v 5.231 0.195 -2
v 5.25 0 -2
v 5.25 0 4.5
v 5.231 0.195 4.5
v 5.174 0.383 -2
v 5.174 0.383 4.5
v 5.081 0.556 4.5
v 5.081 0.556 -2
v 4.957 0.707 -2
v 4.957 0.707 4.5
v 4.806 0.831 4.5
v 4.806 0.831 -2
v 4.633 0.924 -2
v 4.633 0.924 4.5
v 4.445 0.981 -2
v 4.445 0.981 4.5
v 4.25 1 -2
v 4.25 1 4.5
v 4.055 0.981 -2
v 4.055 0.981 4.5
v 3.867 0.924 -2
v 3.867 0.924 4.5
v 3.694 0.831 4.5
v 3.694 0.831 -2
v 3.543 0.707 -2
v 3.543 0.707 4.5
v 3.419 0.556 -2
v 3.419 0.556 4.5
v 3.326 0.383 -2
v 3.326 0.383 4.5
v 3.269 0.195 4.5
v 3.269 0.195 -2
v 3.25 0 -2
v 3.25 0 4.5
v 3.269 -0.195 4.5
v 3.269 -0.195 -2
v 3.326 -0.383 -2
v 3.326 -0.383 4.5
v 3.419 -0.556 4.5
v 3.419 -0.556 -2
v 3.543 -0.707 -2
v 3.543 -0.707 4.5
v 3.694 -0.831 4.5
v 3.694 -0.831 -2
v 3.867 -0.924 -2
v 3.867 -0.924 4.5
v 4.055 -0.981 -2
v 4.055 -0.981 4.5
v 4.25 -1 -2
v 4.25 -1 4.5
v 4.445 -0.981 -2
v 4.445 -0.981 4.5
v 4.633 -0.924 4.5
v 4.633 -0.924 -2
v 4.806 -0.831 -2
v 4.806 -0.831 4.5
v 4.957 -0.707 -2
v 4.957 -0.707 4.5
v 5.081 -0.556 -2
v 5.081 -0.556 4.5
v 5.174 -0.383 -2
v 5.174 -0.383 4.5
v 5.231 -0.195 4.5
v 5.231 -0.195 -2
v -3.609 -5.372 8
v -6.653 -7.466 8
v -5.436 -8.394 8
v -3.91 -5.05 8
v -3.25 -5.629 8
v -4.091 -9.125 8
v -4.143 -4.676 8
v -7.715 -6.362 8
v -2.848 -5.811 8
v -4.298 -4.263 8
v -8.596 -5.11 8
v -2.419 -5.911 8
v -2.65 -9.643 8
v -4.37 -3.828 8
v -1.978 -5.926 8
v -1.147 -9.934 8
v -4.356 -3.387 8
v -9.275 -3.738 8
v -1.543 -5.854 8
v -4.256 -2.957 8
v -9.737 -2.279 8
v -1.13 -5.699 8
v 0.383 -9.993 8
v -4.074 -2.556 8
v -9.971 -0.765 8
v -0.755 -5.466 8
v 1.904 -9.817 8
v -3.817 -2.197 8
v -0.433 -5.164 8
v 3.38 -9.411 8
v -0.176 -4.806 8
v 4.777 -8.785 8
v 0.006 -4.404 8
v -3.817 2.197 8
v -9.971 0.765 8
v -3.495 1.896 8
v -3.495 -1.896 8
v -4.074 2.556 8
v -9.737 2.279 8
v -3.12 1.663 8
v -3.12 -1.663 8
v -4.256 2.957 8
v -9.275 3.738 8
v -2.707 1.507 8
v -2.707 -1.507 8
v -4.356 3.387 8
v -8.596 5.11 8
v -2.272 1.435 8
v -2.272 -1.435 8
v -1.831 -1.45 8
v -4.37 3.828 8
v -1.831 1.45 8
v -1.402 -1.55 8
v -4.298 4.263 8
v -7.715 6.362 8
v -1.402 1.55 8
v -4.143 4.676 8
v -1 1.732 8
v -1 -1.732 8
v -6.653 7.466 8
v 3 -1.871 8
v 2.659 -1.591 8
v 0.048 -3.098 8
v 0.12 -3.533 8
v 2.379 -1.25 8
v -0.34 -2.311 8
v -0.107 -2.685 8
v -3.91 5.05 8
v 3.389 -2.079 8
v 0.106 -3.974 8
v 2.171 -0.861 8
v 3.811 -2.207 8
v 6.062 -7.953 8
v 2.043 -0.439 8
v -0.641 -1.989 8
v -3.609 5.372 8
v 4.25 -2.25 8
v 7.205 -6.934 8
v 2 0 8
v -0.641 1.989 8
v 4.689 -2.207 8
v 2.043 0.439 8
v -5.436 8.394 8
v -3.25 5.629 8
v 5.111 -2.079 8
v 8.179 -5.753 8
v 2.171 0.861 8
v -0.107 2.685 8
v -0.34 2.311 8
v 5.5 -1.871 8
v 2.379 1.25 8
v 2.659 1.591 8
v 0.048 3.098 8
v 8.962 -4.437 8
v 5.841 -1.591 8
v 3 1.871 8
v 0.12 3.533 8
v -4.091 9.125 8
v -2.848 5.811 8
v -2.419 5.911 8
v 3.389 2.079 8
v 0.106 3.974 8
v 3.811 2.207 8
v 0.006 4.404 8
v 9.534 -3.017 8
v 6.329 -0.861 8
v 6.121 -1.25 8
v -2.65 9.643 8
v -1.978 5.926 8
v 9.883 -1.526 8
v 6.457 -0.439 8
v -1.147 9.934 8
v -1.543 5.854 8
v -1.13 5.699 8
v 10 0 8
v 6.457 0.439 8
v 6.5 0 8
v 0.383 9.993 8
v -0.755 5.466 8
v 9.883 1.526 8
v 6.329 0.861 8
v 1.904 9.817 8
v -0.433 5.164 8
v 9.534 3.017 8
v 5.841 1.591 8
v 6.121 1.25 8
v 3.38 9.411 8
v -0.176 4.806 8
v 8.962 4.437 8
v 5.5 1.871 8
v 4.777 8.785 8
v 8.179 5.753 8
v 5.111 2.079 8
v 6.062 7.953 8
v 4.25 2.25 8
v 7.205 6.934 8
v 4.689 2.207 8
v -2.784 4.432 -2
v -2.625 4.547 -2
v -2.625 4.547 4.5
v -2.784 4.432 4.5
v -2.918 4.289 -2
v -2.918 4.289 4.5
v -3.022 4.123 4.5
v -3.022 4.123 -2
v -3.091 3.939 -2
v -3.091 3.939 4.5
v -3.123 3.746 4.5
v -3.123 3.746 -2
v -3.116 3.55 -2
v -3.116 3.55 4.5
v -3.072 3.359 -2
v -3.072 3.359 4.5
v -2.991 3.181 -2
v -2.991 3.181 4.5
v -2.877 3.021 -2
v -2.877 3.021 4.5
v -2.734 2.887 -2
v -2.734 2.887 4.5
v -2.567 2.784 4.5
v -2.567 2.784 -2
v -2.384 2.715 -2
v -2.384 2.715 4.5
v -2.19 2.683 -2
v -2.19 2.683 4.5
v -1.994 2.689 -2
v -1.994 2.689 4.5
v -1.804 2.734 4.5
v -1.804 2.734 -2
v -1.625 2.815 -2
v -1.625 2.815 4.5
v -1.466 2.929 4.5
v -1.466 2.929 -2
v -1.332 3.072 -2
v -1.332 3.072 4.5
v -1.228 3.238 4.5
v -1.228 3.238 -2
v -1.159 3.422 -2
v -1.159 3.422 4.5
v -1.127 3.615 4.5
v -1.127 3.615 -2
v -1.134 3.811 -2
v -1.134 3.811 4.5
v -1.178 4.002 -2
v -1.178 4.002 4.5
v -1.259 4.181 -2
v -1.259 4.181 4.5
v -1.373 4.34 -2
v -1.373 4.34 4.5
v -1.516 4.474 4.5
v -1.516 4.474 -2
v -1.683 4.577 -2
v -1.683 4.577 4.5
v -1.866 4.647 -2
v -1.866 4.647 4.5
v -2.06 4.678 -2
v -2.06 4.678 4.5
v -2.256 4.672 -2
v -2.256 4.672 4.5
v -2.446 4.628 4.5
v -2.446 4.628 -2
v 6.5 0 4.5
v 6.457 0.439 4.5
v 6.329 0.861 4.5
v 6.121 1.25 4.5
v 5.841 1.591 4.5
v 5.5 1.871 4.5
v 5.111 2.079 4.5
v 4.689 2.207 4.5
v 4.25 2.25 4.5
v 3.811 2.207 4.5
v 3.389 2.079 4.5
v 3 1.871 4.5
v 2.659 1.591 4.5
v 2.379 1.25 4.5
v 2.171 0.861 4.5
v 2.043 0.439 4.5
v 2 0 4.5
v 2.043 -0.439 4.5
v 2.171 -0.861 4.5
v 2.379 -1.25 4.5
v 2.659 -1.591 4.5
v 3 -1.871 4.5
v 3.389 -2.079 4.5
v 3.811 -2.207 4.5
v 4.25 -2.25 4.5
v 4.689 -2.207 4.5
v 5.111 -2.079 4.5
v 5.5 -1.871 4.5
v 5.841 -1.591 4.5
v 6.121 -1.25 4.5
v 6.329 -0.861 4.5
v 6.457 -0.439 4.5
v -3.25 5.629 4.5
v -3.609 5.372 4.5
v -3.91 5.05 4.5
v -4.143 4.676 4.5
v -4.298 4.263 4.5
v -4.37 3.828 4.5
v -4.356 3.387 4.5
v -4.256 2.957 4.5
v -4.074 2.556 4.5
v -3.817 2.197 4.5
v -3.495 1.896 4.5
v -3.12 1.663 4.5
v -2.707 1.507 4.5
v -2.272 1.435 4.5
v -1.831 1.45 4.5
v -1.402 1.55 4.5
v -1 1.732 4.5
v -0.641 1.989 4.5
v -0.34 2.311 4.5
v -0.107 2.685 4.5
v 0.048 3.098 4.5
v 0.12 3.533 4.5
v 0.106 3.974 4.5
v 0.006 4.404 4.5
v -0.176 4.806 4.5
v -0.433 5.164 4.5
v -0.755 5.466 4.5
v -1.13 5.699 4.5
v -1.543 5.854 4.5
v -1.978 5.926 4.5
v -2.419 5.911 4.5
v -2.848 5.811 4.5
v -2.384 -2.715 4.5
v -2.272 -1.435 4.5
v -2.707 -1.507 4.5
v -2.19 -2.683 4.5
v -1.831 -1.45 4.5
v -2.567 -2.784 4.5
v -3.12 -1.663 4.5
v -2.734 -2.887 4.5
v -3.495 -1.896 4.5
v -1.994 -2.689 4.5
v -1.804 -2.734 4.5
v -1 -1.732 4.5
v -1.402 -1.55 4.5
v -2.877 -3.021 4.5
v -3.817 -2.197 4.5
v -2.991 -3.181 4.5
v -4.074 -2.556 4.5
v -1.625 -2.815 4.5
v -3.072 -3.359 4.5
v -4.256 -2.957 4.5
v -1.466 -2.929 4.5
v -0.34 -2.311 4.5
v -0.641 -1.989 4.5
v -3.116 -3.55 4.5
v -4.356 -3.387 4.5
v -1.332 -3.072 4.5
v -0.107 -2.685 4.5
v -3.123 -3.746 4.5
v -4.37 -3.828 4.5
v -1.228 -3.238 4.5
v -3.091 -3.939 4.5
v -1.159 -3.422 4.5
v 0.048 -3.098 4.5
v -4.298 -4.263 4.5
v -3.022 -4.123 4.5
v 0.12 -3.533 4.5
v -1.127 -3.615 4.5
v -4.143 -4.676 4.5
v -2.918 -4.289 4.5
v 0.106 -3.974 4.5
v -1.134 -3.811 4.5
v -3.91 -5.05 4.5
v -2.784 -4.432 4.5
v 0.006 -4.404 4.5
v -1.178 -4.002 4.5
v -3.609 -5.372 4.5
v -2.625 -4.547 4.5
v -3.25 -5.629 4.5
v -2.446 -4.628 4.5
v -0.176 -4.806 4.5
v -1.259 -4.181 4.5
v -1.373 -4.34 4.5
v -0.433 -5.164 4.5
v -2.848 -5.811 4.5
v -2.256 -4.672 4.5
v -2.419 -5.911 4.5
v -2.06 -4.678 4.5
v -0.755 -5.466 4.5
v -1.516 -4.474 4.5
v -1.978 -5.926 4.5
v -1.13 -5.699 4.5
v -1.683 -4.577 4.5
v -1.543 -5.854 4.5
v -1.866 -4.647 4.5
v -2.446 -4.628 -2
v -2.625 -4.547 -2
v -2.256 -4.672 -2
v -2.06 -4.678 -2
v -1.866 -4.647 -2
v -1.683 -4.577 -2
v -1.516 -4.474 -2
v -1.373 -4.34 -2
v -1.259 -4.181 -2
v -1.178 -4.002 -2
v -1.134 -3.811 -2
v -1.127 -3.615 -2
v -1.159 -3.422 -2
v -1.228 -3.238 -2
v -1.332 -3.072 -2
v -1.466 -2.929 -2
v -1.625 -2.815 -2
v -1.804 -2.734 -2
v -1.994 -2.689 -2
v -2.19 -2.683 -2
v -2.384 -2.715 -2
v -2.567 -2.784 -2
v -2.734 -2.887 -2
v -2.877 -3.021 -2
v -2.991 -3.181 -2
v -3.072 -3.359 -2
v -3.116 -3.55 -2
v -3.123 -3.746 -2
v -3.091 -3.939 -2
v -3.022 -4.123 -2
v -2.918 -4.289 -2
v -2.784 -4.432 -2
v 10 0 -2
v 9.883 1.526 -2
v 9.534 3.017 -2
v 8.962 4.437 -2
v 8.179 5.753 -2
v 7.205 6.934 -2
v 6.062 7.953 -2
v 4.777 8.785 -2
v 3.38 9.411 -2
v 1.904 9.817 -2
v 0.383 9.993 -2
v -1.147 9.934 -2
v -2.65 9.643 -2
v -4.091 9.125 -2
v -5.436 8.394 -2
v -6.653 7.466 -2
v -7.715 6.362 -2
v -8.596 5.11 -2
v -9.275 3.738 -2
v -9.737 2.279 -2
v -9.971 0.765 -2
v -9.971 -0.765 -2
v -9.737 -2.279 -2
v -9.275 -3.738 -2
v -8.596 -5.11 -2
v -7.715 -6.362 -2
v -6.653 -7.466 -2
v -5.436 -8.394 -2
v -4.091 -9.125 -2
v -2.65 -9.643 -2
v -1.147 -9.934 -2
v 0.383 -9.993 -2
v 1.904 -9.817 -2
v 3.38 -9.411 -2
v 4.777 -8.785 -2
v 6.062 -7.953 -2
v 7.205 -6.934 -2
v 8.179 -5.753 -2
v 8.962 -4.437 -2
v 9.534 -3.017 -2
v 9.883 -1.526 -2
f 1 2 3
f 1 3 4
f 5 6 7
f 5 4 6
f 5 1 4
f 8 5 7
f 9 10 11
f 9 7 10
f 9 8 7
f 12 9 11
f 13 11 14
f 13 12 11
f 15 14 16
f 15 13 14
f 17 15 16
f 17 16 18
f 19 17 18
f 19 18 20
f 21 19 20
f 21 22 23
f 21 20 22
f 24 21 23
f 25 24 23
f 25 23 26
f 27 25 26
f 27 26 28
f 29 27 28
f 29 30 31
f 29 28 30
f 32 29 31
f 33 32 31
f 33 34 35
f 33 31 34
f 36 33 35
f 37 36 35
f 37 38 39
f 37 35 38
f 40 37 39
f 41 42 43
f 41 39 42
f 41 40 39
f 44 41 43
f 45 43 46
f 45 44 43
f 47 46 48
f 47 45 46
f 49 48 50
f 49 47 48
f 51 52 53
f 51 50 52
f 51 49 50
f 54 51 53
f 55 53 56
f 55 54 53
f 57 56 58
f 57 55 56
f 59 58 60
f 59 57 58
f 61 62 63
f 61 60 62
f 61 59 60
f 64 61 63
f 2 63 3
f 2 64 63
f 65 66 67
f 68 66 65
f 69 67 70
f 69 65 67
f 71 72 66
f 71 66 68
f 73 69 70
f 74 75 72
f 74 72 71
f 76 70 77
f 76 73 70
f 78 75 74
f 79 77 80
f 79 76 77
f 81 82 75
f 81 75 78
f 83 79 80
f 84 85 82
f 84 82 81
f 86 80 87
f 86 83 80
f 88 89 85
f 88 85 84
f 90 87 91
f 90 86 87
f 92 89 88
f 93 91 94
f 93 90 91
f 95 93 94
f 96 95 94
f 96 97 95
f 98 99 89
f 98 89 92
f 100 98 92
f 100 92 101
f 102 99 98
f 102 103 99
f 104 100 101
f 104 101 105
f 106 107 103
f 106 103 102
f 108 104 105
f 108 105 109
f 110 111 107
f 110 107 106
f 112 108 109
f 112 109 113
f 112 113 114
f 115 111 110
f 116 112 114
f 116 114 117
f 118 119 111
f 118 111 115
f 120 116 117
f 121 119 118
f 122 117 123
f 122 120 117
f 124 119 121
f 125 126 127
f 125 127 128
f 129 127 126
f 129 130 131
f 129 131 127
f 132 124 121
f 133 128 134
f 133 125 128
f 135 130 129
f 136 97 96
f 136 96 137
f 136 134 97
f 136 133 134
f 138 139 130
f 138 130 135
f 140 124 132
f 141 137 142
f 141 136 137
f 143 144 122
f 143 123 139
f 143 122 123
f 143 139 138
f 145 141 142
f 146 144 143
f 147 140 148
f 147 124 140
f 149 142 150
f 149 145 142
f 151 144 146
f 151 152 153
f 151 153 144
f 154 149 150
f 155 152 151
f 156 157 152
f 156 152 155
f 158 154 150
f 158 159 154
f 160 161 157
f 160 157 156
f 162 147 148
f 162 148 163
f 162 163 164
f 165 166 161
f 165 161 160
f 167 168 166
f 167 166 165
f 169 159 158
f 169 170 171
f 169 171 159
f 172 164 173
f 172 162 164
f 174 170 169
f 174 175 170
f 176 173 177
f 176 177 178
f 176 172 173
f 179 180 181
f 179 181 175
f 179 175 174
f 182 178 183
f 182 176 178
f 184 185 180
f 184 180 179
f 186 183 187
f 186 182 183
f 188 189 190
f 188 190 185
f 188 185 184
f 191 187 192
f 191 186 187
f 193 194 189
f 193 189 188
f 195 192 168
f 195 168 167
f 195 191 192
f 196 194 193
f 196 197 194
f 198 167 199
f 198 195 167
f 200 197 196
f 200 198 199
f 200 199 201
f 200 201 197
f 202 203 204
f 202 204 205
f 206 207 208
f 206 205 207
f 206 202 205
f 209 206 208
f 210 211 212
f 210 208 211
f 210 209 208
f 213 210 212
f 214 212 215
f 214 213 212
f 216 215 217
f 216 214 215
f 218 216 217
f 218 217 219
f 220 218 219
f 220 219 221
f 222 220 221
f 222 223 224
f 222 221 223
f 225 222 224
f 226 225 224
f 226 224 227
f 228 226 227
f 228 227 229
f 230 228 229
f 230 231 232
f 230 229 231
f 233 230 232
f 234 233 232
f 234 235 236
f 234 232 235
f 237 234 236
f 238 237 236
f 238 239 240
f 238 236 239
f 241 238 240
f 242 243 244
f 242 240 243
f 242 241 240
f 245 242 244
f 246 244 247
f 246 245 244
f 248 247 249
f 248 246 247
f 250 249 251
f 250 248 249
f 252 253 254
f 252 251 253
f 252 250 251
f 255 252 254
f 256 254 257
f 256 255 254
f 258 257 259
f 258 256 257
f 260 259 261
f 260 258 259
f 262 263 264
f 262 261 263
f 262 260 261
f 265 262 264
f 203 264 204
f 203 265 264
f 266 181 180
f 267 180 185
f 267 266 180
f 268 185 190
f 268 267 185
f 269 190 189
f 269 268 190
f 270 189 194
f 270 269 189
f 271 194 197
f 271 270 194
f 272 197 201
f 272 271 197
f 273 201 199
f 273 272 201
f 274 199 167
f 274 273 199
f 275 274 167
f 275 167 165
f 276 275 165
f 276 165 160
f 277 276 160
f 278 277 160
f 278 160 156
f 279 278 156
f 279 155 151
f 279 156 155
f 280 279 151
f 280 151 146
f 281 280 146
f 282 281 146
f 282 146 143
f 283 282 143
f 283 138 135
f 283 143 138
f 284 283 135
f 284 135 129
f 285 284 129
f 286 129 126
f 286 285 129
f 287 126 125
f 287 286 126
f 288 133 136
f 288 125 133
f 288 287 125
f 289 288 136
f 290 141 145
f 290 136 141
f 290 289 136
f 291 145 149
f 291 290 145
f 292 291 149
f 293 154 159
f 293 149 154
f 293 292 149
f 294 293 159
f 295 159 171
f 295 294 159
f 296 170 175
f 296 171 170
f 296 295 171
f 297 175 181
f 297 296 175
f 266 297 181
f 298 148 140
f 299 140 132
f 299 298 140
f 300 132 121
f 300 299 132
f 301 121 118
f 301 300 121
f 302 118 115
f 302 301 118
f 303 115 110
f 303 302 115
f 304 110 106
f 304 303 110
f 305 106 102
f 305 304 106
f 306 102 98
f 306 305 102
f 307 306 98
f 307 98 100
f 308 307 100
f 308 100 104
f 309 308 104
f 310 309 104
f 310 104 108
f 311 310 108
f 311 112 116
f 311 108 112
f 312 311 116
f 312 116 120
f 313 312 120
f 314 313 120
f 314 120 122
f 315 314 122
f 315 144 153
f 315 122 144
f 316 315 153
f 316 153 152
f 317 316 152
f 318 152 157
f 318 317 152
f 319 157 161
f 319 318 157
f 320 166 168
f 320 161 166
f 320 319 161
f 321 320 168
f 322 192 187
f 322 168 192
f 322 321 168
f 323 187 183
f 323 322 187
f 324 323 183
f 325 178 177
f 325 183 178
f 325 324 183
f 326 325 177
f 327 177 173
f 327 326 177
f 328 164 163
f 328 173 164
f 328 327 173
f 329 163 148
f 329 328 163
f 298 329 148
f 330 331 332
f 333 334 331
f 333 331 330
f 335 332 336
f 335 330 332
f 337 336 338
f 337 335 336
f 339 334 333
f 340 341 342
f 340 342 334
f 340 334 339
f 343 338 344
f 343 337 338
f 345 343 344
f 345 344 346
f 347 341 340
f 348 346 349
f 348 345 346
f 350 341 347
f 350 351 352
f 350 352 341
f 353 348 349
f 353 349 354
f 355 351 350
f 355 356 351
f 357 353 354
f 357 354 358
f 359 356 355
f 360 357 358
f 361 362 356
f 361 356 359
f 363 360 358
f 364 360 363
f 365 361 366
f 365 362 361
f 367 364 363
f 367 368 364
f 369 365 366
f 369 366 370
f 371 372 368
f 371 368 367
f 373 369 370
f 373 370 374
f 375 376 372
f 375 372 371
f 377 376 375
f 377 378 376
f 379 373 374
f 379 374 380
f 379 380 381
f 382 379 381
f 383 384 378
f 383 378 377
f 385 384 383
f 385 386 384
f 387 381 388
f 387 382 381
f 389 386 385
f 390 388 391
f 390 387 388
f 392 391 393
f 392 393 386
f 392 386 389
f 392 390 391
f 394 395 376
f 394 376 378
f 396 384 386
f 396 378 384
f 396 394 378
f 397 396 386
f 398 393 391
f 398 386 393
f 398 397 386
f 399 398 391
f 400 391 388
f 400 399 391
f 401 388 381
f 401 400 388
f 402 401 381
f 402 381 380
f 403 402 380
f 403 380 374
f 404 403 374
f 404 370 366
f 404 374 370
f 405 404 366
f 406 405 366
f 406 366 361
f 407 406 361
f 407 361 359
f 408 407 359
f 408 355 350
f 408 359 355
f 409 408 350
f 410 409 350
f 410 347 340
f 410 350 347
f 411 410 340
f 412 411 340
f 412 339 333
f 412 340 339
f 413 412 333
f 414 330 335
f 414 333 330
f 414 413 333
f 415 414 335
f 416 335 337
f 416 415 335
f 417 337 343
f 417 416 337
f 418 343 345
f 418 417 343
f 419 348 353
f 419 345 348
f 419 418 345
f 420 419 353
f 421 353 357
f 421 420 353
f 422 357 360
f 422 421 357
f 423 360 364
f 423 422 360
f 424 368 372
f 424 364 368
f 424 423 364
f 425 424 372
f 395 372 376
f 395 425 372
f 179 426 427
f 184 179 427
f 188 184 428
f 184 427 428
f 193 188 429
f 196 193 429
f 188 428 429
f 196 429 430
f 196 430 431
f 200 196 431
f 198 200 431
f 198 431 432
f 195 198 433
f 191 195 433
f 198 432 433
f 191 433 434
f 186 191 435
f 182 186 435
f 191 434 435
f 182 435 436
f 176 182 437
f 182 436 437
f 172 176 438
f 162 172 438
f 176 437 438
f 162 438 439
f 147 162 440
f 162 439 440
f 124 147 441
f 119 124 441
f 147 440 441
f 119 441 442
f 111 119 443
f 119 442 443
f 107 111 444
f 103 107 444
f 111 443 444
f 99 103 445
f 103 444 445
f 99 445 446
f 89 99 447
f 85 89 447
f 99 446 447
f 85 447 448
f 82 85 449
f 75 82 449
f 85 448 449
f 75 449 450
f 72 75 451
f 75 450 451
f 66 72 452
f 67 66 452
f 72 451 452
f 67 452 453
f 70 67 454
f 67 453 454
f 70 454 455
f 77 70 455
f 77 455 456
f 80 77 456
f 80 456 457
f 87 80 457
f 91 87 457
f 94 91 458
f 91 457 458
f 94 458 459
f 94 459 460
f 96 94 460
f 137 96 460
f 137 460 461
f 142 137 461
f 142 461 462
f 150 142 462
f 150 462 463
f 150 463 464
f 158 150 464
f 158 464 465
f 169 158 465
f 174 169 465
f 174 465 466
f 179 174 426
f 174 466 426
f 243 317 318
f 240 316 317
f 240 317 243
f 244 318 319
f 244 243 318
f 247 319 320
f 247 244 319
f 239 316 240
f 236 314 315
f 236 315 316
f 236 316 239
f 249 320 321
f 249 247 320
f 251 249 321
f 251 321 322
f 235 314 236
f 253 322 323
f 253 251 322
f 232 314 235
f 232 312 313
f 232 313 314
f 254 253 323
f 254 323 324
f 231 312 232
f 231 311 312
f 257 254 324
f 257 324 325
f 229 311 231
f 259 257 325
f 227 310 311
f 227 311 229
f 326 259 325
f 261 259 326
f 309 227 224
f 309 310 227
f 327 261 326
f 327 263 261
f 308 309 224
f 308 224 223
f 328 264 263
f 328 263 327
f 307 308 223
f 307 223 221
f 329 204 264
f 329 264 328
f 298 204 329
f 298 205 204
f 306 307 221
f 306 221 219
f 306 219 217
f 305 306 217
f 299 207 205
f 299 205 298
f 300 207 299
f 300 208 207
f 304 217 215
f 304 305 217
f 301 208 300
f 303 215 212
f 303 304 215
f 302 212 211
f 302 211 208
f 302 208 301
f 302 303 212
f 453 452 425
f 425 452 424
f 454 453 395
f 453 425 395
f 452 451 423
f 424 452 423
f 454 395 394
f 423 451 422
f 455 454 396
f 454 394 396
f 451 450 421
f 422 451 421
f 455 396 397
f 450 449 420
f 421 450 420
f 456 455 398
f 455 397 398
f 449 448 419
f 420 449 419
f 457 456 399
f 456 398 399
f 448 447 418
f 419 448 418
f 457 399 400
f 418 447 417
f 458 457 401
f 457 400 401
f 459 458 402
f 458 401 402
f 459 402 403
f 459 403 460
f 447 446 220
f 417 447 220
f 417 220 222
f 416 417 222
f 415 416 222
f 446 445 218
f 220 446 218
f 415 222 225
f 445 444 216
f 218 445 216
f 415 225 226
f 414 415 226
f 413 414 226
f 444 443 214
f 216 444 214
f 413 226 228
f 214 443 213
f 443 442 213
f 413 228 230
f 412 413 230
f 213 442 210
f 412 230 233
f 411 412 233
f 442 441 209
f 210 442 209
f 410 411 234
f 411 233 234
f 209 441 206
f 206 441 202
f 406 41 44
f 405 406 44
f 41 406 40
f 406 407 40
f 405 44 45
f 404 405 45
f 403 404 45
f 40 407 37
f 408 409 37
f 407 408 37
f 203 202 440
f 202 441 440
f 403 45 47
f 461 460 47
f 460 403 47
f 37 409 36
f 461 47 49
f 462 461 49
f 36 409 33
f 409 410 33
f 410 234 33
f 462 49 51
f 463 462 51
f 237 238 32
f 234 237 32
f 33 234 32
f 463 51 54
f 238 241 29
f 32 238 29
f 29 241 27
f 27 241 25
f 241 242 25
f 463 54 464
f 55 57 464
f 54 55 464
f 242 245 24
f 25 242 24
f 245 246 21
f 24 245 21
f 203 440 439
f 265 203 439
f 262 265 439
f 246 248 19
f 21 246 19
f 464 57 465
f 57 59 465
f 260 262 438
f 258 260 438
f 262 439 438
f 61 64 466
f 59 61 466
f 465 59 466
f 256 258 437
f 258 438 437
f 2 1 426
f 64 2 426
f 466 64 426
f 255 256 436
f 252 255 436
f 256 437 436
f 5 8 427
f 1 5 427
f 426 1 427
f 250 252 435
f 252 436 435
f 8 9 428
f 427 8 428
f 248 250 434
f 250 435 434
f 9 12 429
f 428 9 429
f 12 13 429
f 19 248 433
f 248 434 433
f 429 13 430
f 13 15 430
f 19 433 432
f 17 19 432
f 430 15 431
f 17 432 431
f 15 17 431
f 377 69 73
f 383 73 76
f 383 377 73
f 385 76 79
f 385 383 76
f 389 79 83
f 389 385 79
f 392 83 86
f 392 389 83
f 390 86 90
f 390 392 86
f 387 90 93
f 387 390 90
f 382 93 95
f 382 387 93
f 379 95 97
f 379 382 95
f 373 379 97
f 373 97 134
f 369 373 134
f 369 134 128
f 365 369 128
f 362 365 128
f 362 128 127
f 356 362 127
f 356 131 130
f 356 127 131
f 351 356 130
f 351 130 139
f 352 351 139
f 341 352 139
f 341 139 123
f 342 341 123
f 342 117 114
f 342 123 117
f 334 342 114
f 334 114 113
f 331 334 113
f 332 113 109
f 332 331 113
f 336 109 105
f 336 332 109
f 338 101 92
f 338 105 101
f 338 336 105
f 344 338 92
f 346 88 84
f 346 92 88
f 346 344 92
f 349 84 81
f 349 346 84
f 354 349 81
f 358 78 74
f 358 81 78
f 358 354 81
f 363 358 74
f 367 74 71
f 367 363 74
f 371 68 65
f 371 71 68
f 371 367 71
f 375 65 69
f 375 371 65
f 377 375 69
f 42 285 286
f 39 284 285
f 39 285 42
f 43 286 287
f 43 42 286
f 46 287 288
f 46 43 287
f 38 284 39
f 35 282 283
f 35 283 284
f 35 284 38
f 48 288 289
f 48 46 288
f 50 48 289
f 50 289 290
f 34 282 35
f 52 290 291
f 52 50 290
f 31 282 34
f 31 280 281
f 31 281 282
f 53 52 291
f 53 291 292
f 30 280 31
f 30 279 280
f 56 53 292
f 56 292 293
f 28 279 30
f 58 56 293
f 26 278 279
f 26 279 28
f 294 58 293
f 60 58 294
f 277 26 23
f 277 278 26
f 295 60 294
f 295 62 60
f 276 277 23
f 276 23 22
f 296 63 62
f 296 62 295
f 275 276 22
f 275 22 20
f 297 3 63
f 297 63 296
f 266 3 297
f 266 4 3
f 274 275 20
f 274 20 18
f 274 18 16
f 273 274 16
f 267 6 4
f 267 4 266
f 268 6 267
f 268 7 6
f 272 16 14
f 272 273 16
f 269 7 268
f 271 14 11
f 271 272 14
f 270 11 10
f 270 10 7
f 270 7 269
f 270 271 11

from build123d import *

# Parameters (mm, degrees)
CYLINDER157_R     = 2.25
CYLINDER157_DEPTH = 7
CYLINDER156_R     = 1
CYLINDER156_DEPTH = 14
CYLINDER147_R     = 1
CYLINDER147_DEPTH = 1
ARRAY_COUNT       = 3
CYLINDER153_R     = 10
CYLINDER153_DEPTH = 10


with BuildPart() as sealsubtraction:
    # Cylinder157 → Cylinder157 (new body)
    with BuildSketch(Plane.XY.offset(4.5)):
        Circle(CYLINDER157_R)
    extrude(amount=CYLINDER157_DEPTH)


with BuildPart() as bottomwireoutlet:
    # Cylinder156 → Cylinder156 (new body)
    with BuildSketch(Plane.XY.offset(-7)):
        Circle(CYLINDER156_R)
    extrude(amount=CYLINDER156_DEPTH)


with BuildPart() as sealarray:
    # Cylinder147 → Cylinder147 (new body)
    with BuildSketch(Plane.XY.offset(4.5)):
        Circle(CYLINDER147_R)
    extrude(amount=CYLINDER147_DEPTH)

    # Fusion: union SealSubtraction, BottomWireOutlet
    add(sealsubtraction.part)
    add(bottomwireoutlet.part)


with BuildPart() as sealarray_1:
    # Fusion placement: moved
    add(sealarray.part.moved(Location((4.25, 0, 0))))

    # Array: SealArray ×3 about axis
    array_axis = Axis((0, 0, 0), (0, 0, 1))


with BuildPart() as sealarray_2:
    add(sealarray_1.part)
    for i in range(1, ARRAY_COUNT):
        add(sealarray_1.part.rotate(array_axis, i * 360 / ARRAY_COUNT))


with BuildPart() as cut:
    # Cylinder153 → Cylinder153 (new body)
    with BuildSketch(Plane.XY.offset(-2)):
        Circle(CYLINDER153_R)
    extrude(amount=CYLINDER153_DEPTH)

    # Cut: cut SealArray
    add(sealarray_2.part, mode=Mode.SUBTRACT)


solid = cut.part
